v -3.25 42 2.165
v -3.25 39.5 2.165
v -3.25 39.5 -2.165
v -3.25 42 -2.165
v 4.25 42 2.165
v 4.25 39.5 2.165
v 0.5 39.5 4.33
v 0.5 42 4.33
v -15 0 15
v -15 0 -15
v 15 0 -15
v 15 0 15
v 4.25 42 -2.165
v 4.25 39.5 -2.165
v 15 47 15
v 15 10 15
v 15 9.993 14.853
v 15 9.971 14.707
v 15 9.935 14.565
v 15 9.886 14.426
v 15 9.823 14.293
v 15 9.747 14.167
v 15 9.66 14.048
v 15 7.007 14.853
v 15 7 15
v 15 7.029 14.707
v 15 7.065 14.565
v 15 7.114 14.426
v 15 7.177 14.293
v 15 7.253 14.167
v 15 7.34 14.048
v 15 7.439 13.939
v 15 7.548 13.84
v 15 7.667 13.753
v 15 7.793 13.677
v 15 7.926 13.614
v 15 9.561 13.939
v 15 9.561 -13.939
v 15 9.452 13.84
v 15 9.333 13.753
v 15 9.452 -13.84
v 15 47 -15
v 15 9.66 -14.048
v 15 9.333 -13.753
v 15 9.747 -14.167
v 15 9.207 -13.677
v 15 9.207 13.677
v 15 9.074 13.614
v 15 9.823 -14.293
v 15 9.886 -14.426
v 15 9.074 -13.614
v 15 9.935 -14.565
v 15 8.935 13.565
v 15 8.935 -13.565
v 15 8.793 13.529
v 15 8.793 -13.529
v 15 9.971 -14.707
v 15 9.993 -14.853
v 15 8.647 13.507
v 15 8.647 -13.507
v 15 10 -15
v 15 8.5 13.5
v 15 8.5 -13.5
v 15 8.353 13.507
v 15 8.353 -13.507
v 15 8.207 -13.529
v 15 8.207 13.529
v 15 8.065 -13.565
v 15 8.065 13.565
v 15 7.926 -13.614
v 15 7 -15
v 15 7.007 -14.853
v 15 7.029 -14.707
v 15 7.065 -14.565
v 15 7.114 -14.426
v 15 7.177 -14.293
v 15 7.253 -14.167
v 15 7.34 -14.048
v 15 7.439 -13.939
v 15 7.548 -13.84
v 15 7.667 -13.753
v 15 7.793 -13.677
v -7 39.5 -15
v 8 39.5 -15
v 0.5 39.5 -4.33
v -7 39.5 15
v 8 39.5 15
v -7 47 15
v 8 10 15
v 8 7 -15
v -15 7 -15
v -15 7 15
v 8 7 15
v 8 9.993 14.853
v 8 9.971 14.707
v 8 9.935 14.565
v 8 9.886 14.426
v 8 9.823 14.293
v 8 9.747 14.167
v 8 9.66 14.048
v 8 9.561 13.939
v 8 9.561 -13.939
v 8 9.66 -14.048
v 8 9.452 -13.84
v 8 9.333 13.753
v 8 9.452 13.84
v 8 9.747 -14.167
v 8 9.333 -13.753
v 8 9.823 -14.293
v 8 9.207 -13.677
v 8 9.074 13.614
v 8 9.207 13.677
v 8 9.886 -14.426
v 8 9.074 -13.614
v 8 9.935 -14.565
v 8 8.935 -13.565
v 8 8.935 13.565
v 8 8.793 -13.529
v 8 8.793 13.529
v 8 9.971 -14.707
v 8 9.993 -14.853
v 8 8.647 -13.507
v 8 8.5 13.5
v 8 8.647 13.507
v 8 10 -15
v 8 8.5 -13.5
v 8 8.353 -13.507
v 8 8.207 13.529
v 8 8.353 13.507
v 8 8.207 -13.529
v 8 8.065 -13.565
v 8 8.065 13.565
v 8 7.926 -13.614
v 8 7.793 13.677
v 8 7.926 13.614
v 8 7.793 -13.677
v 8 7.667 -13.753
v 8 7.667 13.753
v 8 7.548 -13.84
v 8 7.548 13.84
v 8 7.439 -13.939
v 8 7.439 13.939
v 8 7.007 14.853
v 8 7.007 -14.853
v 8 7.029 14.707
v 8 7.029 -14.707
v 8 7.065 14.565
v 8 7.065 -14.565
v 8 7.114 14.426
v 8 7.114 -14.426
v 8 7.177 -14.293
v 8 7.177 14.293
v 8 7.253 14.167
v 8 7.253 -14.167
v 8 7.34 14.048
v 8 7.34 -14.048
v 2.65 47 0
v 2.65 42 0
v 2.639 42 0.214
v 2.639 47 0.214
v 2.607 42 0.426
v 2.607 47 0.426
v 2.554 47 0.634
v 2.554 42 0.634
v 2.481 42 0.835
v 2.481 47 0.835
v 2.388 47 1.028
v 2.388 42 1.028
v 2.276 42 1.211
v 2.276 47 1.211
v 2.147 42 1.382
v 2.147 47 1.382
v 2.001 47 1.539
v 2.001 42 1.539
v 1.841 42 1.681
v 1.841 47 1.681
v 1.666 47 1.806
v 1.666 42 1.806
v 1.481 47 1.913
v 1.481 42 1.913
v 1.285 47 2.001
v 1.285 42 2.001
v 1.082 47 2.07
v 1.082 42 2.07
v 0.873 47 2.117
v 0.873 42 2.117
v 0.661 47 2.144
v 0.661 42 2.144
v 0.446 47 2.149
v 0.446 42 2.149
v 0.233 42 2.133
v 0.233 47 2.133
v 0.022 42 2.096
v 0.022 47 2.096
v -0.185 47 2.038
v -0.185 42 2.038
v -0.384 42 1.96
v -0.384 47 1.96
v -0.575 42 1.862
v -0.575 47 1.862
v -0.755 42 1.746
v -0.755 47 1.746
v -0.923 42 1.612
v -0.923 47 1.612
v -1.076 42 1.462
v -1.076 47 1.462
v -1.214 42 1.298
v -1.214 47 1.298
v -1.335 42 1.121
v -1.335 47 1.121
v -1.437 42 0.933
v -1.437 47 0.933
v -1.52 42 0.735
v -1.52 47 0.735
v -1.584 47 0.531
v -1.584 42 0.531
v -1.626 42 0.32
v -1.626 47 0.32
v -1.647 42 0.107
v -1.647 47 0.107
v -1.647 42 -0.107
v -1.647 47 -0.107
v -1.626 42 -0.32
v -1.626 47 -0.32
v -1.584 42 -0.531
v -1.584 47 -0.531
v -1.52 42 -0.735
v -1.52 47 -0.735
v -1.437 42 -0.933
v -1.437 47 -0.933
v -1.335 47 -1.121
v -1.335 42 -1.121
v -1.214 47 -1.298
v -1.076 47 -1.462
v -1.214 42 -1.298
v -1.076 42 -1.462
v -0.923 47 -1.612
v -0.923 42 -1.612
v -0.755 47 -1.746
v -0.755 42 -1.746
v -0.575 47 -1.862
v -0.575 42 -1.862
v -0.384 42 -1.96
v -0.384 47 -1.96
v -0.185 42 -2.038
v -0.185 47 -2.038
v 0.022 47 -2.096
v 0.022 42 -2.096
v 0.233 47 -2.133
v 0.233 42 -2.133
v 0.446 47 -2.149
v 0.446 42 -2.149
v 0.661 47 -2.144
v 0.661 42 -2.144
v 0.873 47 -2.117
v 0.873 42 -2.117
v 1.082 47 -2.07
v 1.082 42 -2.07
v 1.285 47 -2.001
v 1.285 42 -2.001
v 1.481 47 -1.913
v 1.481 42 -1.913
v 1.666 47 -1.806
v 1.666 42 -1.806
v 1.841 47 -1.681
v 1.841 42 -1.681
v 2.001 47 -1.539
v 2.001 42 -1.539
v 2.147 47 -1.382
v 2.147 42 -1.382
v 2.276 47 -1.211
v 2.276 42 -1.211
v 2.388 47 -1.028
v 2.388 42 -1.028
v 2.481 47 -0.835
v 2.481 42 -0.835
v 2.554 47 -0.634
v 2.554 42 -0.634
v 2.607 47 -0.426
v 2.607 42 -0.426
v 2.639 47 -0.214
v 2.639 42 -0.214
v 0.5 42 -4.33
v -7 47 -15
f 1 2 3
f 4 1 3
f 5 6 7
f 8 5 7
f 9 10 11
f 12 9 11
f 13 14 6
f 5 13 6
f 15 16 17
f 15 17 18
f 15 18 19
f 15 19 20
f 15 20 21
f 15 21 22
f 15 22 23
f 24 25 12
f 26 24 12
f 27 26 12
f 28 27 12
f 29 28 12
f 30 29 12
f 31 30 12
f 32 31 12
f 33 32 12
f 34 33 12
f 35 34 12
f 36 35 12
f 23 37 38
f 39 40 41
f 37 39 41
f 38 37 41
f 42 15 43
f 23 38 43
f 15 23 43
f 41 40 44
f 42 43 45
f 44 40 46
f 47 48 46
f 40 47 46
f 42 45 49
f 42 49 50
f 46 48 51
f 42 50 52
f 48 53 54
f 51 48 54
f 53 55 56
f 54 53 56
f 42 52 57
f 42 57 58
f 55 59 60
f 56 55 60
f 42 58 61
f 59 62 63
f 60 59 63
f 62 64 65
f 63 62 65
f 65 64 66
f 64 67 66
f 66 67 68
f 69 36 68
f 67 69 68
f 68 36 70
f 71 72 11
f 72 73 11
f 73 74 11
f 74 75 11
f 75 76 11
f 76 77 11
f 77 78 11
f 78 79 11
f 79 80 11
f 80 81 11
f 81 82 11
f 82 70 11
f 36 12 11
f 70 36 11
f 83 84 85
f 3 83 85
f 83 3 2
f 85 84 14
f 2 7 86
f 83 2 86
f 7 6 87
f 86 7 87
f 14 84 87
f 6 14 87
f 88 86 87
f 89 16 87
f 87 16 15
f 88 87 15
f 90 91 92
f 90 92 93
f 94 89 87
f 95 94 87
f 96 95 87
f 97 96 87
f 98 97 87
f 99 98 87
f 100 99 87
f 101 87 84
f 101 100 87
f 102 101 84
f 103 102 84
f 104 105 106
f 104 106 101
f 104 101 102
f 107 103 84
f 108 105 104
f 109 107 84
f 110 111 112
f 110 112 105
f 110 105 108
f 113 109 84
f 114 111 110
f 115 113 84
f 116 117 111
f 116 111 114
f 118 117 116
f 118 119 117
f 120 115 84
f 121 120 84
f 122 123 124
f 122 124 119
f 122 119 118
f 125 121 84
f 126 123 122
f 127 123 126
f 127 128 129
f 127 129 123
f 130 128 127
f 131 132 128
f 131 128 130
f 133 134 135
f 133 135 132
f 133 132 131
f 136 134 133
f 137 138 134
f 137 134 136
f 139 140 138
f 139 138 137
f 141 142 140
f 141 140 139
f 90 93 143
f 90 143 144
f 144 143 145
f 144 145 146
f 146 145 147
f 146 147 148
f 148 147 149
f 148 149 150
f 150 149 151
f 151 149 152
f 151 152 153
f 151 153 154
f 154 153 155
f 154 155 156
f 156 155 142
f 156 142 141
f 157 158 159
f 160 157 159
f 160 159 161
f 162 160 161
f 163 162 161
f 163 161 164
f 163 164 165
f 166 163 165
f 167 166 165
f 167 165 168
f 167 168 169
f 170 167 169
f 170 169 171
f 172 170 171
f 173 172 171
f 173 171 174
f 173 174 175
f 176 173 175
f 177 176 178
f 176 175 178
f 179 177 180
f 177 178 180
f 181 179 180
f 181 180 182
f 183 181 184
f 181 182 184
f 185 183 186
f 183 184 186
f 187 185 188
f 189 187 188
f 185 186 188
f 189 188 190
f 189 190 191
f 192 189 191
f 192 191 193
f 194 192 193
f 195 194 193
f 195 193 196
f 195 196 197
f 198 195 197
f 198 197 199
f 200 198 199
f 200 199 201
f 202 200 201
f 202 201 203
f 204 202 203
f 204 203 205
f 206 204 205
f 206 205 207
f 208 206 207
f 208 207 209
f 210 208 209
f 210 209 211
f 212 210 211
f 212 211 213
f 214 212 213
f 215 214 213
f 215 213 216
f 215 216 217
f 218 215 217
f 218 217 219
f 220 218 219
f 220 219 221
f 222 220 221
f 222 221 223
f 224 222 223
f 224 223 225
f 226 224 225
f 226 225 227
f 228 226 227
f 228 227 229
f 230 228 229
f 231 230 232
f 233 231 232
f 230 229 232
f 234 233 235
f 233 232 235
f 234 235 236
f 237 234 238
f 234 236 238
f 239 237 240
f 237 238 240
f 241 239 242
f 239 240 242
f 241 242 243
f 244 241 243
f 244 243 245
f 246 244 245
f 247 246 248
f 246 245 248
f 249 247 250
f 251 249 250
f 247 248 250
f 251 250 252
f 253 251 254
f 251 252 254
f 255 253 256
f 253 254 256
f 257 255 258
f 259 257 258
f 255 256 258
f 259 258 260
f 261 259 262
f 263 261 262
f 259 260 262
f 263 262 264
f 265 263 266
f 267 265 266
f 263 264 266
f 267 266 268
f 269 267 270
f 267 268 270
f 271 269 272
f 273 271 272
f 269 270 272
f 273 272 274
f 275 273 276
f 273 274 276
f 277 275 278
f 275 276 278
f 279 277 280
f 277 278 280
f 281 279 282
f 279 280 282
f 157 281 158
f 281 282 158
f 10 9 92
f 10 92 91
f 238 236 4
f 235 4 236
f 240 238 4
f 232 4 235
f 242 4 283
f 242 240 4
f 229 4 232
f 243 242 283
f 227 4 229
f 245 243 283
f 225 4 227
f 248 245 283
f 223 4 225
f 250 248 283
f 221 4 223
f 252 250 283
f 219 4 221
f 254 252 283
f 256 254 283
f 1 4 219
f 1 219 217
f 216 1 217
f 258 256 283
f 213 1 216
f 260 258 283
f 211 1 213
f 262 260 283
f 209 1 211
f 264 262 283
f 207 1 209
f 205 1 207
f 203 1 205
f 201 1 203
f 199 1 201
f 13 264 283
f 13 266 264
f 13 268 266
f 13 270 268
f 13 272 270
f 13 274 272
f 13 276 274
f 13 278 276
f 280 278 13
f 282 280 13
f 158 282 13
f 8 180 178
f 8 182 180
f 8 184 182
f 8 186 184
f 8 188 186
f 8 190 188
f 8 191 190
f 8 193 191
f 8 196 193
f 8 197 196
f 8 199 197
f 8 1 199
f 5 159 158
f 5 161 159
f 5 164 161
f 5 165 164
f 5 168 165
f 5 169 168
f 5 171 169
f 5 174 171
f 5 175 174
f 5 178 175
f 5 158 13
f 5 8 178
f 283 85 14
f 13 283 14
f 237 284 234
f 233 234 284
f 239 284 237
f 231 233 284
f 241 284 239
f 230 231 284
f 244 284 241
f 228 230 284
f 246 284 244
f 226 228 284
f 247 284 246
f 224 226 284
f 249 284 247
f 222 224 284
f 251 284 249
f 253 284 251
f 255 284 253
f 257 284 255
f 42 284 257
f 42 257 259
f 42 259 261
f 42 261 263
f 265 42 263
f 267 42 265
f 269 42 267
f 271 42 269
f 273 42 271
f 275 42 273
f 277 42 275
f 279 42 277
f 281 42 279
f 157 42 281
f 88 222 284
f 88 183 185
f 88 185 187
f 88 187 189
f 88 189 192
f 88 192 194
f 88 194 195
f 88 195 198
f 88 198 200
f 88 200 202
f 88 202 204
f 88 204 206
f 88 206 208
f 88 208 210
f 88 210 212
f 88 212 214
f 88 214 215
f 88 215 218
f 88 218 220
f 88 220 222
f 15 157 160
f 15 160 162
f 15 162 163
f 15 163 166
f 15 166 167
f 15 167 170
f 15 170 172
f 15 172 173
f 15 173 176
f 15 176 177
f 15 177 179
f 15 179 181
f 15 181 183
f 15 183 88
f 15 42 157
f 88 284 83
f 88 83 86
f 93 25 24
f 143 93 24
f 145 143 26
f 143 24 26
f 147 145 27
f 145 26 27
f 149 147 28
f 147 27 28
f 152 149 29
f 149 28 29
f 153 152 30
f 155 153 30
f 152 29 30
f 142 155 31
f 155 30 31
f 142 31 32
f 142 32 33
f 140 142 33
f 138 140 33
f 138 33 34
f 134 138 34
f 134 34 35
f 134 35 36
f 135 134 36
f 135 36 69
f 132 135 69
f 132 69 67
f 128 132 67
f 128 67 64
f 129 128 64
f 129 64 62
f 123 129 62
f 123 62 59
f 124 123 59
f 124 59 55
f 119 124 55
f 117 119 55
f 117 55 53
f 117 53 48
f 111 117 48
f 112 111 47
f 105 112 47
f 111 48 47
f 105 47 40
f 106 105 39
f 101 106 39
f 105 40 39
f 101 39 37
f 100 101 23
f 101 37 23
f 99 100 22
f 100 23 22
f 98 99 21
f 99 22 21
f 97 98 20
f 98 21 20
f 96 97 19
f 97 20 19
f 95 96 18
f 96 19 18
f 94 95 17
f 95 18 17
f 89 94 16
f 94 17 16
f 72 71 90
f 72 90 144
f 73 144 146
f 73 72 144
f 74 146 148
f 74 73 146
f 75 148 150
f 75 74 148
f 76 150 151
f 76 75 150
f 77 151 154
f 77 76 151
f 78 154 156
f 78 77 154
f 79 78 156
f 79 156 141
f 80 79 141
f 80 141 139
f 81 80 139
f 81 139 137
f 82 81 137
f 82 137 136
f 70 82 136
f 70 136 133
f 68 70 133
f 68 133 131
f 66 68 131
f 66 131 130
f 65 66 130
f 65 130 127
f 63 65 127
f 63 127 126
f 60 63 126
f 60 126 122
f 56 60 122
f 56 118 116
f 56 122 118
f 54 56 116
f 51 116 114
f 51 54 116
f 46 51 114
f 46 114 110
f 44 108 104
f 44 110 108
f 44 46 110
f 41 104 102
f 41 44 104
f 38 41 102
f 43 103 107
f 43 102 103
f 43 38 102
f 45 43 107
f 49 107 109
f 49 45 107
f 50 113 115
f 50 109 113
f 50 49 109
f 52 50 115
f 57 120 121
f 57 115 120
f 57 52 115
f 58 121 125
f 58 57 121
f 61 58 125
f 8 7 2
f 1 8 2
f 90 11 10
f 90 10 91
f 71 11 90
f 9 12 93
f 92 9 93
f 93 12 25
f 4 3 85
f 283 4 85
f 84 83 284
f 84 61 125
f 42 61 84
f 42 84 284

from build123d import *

# Parameters (mm, degrees)
SKETCH1_W                = 30
SKETCH1_H                = 30
BOSS_EXTRUDE1_DEPTH      = 7
SKETCH2_W                = 7
SKETCH2_H                = 30
BOSS_EXTRUDE2_DEPTH      = 40
SKETCH3_W                = 30
SKETCH3_H                = 7.5
BOSS_EXTRUDE3_DEPTH      = 15
CUT_EXTRUDE1_DEPTH       = 2.5
M4_CLEARANCE_HOLE1_D     = 4.3
M4_CLEARANCE_HOLE1_DEPTH = 6
M4_CLEARANCE_HOLE1_TIP   = 1.291850331
CUT_EXTRUDE3_DEPTH       = 13


with BuildPart() as part:
    # Sketch1 → Boss-Extrude1 (new body)
    with BuildSketch(Plane(origin=(0, 0, 0), x_dir=(1, 0, 0), z_dir=(0, 1, 0))):
        Rectangle(SKETCH1_W, SKETCH1_H)
    extrude(amount=BOSS_EXTRUDE1_DEPTH)

    # Sketch2 → Boss-Extrude2 (add)
    with BuildSketch(Plane(origin=(0, 7, 0), x_dir=(1, 0, 0), z_dir=(0, 1, 0))):
        with Locations((11.5, 0)):
            Rectangle(SKETCH2_W, SKETCH2_H)
    extrude(amount=BOSS_EXTRUDE2_DEPTH)

    # Sketch3 → Boss-Extrude3 (add)
    with BuildSketch(Plane.ZY.offset(-8)):
        with Locations((0, 43.25)):
            Rectangle(SKETCH3_W, SKETCH3_H)
    extrude(amount=BOSS_EXTRUDE3_DEPTH)

    # Sketch4 → Cut-Extrude1 (cut)
    with BuildSketch(Plane.XZ.offset(-39.5)):
        Polygon((0.5, -4.330127019), (4.25, -2.165063509), (4.25, 2.165063509), (0.5, 4.330127019), (-3.25, 2.165063509), (-3.25, -2.165063509), align=None)
    extrude(amount=-CUT_EXTRUDE1_DEPTH, mode=Mode.SUBTRACT)

    # M4 Clearance Hole1
    with Locations(Plane(origin=(0, 47, 0), x_dir=(-1, 0, 0), z_dir=(0, 1, 0))):
        with Locations((-0.5, 0)):
            Hole(M4_CLEARANCE_HOLE1_D / 2, depth=M4_CLEARANCE_HOLE1_DEPTH)
            with Locations((0, 0, -(M4_CLEARANCE_HOLE1_DEPTH + M4_CLEARANCE_HOLE1_TIP / 2))):  # 118° drill point
                Cone(0, M4_CLEARANCE_HOLE1_D / 2, M4_CLEARANCE_HOLE1_TIP, mode=Mode.SUBTRACT)

    # Sketch8 → Cut-Extrude3 (cut)
    with BuildSketch(Plane(origin=(15, 0, 0), x_dir=(0, 0, -1), z_dir=(1, 0, 0))):
        with BuildLine():
            Line((-15, 10), (-15, 7))
            ThreePointArc((-15, 7), (-13.5, 8.5), (-15, 10))
        make_face()
        with BuildLine():
            Line((15, 10), (15, 7))
            ThreePointArc((15, 7), (13.5, 8.5), (15, 10))
        make_face()
    extrude(amount=-CUT_EXTRUDE3_DEPTH, mode=Mode.SUBTRACT)


solid = part.part
